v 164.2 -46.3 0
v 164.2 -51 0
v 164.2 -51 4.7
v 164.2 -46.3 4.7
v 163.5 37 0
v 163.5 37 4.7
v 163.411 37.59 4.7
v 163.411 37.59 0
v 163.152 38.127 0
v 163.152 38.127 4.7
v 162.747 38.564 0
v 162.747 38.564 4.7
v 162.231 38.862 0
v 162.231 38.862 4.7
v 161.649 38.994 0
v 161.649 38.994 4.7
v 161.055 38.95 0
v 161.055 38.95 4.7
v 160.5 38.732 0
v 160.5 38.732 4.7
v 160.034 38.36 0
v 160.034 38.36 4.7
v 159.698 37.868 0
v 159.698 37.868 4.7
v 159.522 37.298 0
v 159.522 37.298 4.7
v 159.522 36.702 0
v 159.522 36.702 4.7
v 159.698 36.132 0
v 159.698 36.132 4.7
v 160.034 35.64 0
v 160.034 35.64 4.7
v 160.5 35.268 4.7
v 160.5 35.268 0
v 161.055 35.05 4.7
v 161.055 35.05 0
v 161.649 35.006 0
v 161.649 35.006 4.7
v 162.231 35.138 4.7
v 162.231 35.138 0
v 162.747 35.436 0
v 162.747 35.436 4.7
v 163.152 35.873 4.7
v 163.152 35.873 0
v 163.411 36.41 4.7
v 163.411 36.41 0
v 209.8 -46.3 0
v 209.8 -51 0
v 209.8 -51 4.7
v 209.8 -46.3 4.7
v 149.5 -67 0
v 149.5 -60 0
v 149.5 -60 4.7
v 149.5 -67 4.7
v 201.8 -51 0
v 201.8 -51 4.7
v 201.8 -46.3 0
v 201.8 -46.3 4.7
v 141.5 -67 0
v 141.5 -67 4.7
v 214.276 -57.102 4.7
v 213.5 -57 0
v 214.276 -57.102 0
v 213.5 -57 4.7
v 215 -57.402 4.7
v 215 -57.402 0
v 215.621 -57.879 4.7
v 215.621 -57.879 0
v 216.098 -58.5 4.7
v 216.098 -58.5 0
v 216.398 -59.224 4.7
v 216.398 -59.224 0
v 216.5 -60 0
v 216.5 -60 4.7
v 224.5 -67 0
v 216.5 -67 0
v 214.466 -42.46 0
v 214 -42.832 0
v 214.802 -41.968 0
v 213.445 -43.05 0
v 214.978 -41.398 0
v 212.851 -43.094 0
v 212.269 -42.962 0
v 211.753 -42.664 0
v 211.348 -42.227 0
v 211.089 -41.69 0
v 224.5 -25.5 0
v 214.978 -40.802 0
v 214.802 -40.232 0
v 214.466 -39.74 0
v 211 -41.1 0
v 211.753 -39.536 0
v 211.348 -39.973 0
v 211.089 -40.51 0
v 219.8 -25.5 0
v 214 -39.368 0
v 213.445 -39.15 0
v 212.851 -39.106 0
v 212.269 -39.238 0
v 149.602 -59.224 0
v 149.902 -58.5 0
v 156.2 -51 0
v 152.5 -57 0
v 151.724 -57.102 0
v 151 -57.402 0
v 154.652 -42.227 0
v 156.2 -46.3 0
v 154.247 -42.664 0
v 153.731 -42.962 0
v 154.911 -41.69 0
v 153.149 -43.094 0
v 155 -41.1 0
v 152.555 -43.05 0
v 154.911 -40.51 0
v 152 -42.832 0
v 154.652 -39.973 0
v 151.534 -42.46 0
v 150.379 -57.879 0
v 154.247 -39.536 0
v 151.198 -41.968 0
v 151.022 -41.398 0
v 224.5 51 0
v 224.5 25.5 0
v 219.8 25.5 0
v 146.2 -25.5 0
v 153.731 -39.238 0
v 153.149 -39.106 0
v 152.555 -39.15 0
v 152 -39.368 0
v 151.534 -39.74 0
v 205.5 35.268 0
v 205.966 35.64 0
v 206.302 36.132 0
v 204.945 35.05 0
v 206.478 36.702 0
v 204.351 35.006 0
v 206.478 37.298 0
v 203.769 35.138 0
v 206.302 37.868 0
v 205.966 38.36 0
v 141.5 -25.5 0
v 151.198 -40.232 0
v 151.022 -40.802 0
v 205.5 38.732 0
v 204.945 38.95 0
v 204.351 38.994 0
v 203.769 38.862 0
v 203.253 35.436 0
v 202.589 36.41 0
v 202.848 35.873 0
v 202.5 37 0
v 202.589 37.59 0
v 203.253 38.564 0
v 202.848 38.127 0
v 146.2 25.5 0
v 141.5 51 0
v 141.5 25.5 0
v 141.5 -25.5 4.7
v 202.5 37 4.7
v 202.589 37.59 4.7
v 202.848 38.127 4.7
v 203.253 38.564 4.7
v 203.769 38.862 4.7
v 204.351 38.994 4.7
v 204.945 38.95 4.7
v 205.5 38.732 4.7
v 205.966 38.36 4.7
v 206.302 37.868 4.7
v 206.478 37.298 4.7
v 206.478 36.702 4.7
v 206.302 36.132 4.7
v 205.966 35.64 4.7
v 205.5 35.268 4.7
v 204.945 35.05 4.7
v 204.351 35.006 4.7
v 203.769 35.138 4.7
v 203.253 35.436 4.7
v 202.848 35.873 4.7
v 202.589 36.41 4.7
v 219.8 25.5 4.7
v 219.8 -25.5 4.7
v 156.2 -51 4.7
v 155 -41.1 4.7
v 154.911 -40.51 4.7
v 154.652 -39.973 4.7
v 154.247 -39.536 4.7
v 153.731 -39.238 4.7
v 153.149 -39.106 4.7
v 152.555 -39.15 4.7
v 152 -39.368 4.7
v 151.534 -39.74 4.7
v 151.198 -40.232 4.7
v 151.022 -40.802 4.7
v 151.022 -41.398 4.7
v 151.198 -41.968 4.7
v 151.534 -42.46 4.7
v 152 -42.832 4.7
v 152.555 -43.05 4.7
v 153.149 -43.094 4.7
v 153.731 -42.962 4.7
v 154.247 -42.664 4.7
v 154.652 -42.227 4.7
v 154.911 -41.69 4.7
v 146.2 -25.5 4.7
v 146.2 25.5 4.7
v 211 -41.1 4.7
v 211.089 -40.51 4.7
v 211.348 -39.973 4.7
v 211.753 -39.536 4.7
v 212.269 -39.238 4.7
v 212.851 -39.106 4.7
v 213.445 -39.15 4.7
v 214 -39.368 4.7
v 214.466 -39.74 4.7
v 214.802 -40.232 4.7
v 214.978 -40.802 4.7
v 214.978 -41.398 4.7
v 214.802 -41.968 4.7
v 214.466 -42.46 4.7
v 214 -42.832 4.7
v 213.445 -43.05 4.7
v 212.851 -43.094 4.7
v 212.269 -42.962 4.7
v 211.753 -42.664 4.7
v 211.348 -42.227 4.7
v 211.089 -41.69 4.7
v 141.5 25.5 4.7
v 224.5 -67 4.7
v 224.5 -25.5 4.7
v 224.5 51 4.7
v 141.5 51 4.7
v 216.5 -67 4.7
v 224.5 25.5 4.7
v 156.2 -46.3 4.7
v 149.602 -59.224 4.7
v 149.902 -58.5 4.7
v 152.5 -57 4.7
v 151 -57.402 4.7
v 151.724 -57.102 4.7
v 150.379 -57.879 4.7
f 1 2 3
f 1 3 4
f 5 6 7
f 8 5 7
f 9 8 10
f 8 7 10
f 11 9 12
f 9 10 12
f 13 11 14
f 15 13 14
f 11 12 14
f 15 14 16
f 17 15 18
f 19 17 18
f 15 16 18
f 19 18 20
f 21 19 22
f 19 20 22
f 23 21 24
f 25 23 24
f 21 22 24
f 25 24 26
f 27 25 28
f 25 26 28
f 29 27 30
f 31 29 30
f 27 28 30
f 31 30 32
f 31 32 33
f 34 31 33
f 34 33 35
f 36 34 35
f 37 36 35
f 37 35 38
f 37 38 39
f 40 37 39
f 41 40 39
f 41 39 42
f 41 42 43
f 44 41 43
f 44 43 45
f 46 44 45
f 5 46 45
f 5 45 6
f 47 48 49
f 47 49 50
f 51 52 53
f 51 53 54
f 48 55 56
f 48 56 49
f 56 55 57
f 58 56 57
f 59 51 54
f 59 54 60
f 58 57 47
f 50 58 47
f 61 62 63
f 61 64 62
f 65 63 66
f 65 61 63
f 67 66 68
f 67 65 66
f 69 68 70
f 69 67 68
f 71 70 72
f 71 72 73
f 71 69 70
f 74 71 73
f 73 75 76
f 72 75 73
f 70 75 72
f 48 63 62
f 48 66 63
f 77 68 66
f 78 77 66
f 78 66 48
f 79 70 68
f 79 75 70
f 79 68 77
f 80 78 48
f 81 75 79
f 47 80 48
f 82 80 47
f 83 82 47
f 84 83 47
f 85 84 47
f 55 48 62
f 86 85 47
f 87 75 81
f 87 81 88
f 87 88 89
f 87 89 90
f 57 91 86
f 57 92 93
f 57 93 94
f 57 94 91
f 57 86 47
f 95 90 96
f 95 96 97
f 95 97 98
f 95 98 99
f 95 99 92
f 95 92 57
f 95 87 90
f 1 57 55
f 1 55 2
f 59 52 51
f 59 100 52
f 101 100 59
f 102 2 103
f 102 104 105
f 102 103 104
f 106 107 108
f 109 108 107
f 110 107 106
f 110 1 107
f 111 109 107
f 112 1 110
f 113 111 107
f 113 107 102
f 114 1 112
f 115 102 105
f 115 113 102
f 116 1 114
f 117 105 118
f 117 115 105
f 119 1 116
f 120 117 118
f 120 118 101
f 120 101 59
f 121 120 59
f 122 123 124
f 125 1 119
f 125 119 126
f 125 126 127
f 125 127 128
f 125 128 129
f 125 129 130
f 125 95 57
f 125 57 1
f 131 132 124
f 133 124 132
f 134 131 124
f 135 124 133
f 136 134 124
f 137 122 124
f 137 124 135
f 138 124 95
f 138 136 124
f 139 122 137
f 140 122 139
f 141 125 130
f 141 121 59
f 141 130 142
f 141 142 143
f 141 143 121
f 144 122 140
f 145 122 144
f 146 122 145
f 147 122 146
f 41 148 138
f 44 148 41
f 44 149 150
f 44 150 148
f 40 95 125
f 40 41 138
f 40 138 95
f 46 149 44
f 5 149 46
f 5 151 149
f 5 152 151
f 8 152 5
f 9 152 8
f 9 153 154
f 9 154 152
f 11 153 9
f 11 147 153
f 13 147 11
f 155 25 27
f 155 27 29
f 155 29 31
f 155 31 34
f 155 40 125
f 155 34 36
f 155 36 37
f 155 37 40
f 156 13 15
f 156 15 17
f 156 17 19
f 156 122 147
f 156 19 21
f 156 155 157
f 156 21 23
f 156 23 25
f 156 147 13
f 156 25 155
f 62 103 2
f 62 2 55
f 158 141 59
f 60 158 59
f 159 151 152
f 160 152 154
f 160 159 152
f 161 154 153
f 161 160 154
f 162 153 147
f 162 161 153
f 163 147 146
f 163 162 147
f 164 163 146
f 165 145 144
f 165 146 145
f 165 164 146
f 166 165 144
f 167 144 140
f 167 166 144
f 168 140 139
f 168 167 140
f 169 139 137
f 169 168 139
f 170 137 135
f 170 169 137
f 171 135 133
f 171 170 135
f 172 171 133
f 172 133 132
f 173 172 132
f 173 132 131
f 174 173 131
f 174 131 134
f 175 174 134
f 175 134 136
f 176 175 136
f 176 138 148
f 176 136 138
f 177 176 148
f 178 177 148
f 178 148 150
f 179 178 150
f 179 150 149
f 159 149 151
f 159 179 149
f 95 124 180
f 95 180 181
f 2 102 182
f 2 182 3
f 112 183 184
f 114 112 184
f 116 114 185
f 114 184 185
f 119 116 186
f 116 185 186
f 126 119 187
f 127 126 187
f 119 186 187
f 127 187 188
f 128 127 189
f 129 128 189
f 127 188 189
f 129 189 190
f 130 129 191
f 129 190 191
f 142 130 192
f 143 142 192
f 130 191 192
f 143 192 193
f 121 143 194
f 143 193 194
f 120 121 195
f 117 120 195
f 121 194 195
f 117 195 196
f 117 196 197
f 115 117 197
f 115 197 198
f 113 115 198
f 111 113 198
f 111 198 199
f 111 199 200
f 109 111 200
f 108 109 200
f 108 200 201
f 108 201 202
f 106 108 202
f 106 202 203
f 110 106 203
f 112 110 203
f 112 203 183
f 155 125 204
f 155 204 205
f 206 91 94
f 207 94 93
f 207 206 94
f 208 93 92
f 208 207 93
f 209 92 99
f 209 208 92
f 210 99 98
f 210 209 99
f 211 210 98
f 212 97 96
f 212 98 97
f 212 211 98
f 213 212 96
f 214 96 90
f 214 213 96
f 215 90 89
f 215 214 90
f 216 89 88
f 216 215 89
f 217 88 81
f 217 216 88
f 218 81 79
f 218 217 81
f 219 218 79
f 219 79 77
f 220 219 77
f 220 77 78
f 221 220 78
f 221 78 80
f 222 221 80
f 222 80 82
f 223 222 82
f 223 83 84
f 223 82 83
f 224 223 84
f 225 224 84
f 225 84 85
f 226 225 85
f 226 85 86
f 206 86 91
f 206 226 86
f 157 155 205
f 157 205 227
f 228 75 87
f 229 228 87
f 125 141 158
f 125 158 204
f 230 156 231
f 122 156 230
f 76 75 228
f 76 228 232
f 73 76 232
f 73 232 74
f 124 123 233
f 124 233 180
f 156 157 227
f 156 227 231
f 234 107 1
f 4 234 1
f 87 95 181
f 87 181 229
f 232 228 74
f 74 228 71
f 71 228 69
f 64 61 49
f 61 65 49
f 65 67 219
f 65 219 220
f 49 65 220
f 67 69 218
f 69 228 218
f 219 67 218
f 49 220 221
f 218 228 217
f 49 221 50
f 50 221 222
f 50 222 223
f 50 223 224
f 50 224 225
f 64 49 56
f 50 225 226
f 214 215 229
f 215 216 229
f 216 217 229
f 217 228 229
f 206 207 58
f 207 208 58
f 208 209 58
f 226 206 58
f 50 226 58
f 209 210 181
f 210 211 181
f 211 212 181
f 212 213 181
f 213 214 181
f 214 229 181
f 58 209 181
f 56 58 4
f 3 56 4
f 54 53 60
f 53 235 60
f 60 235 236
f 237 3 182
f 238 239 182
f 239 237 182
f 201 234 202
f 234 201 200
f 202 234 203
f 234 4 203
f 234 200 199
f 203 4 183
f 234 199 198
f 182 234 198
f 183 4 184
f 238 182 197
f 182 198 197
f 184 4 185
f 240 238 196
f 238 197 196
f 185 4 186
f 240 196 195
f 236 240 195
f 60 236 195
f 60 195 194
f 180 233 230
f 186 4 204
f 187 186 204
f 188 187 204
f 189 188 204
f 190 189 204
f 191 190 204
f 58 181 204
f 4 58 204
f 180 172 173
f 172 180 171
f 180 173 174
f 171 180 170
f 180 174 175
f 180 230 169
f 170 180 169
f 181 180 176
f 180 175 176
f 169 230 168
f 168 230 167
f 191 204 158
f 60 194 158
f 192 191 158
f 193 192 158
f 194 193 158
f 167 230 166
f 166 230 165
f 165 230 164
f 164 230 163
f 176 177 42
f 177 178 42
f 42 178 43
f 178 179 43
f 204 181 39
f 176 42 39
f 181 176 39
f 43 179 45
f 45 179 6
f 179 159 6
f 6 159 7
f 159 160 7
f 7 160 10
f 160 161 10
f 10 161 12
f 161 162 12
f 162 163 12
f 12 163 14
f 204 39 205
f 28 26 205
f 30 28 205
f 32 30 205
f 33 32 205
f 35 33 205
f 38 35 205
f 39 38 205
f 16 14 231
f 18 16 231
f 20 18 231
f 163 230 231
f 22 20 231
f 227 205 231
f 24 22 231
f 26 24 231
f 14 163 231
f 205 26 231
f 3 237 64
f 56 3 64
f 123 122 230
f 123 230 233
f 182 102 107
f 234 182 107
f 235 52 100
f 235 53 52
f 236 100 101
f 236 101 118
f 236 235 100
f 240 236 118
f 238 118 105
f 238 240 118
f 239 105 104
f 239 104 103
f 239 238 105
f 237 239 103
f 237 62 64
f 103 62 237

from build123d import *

# Parameters (mm, degrees)
SKETCH013_W             = 8
SKETCH013_H             = 4.7
PAD009_DEPTH            = 4.7
FILLET002_R             = 3
SKETCH020_R             = 2
POCKET002_DEPTH         = 293.388305
BODY015_PLACEMENT_ANGLE = 90


with BuildPart() as part:
    # Sketch013 → Pad009 (new body)
    with BuildSketch(Plane.XZ):
        Polygon((-41.5, -51), (-41.5, -25.5), (-36.8, -25.5), (-36.8, 25.5), (-41.5, 25.5), (-41.5, 51), (41.5, 51), (41.5, 25.5), (36.8, 25.5), (36.8, -25.5), (41.5, -25.5), (41.5, -51), (41.5, -67), (33.5, -67), (33.5, -57), (-33.5, -57), (-33.5, -67), (-41.5, -67), align=None)
        with Locations((-22.8, -48.65)):
            Rectangle(SKETCH013_W, SKETCH013_H, mode=Mode.SUBTRACT)
        with Locations((22.8, -48.65)):
            Rectangle(SKETCH013_W, SKETCH013_H, mode=Mode.SUBTRACT)
    extrude(amount=PAD009_DEPTH)

    # Fillet002
    fillet002_edges = [part.edges().sort_by_distance(p)[0] for p in [
        (-33.5, -2.35, -57),
        (33.5, -2.35, -57),
    ]]
    fillet(fillet002_edges, radius=FILLET002_R)

    # Sketch020 (on Face5 of Fillet002) → Pocket002 (cut, through all)
    with BuildSketch(Plane.XZ.offset(4.7)):
        with Locations((-21.5, 37)):
            Circle(SKETCH020_R)
        with Locations((-30, -41.1)):
            Circle(SKETCH020_R)
    pocket002 = extrude(amount=-POCKET002_DEPTH, mode=Mode.SUBTRACT)

    # Mirrored001: Pocket002 across Sketch020 V_Axis
    add(pocket002.mirror(Plane(origin=(0, -4.7, 0), x_dir=(0, -1, 0), z_dir=(1, 0, 0))), mode=Mode.SUBTRACT)


with BuildPart() as part_1:
    # Body009 placement: moved
    add(part.part.moved(Location((0, -36.8, 48))))


with BuildPart() as part_2:
    # Clone002 placement: moved
    add(part_1.part.moved(Location((0, 36.8, -48))))


with BuildPart() as part_3:
    # Body015 placement: moved
    add(part_2.part.moved(Location((183, 0, 0))).rotate(Axis((183, 0, 0), (-1, 0, 0)), BODY015_PLACEMENT_ANGLE))


solid = part_3.part
